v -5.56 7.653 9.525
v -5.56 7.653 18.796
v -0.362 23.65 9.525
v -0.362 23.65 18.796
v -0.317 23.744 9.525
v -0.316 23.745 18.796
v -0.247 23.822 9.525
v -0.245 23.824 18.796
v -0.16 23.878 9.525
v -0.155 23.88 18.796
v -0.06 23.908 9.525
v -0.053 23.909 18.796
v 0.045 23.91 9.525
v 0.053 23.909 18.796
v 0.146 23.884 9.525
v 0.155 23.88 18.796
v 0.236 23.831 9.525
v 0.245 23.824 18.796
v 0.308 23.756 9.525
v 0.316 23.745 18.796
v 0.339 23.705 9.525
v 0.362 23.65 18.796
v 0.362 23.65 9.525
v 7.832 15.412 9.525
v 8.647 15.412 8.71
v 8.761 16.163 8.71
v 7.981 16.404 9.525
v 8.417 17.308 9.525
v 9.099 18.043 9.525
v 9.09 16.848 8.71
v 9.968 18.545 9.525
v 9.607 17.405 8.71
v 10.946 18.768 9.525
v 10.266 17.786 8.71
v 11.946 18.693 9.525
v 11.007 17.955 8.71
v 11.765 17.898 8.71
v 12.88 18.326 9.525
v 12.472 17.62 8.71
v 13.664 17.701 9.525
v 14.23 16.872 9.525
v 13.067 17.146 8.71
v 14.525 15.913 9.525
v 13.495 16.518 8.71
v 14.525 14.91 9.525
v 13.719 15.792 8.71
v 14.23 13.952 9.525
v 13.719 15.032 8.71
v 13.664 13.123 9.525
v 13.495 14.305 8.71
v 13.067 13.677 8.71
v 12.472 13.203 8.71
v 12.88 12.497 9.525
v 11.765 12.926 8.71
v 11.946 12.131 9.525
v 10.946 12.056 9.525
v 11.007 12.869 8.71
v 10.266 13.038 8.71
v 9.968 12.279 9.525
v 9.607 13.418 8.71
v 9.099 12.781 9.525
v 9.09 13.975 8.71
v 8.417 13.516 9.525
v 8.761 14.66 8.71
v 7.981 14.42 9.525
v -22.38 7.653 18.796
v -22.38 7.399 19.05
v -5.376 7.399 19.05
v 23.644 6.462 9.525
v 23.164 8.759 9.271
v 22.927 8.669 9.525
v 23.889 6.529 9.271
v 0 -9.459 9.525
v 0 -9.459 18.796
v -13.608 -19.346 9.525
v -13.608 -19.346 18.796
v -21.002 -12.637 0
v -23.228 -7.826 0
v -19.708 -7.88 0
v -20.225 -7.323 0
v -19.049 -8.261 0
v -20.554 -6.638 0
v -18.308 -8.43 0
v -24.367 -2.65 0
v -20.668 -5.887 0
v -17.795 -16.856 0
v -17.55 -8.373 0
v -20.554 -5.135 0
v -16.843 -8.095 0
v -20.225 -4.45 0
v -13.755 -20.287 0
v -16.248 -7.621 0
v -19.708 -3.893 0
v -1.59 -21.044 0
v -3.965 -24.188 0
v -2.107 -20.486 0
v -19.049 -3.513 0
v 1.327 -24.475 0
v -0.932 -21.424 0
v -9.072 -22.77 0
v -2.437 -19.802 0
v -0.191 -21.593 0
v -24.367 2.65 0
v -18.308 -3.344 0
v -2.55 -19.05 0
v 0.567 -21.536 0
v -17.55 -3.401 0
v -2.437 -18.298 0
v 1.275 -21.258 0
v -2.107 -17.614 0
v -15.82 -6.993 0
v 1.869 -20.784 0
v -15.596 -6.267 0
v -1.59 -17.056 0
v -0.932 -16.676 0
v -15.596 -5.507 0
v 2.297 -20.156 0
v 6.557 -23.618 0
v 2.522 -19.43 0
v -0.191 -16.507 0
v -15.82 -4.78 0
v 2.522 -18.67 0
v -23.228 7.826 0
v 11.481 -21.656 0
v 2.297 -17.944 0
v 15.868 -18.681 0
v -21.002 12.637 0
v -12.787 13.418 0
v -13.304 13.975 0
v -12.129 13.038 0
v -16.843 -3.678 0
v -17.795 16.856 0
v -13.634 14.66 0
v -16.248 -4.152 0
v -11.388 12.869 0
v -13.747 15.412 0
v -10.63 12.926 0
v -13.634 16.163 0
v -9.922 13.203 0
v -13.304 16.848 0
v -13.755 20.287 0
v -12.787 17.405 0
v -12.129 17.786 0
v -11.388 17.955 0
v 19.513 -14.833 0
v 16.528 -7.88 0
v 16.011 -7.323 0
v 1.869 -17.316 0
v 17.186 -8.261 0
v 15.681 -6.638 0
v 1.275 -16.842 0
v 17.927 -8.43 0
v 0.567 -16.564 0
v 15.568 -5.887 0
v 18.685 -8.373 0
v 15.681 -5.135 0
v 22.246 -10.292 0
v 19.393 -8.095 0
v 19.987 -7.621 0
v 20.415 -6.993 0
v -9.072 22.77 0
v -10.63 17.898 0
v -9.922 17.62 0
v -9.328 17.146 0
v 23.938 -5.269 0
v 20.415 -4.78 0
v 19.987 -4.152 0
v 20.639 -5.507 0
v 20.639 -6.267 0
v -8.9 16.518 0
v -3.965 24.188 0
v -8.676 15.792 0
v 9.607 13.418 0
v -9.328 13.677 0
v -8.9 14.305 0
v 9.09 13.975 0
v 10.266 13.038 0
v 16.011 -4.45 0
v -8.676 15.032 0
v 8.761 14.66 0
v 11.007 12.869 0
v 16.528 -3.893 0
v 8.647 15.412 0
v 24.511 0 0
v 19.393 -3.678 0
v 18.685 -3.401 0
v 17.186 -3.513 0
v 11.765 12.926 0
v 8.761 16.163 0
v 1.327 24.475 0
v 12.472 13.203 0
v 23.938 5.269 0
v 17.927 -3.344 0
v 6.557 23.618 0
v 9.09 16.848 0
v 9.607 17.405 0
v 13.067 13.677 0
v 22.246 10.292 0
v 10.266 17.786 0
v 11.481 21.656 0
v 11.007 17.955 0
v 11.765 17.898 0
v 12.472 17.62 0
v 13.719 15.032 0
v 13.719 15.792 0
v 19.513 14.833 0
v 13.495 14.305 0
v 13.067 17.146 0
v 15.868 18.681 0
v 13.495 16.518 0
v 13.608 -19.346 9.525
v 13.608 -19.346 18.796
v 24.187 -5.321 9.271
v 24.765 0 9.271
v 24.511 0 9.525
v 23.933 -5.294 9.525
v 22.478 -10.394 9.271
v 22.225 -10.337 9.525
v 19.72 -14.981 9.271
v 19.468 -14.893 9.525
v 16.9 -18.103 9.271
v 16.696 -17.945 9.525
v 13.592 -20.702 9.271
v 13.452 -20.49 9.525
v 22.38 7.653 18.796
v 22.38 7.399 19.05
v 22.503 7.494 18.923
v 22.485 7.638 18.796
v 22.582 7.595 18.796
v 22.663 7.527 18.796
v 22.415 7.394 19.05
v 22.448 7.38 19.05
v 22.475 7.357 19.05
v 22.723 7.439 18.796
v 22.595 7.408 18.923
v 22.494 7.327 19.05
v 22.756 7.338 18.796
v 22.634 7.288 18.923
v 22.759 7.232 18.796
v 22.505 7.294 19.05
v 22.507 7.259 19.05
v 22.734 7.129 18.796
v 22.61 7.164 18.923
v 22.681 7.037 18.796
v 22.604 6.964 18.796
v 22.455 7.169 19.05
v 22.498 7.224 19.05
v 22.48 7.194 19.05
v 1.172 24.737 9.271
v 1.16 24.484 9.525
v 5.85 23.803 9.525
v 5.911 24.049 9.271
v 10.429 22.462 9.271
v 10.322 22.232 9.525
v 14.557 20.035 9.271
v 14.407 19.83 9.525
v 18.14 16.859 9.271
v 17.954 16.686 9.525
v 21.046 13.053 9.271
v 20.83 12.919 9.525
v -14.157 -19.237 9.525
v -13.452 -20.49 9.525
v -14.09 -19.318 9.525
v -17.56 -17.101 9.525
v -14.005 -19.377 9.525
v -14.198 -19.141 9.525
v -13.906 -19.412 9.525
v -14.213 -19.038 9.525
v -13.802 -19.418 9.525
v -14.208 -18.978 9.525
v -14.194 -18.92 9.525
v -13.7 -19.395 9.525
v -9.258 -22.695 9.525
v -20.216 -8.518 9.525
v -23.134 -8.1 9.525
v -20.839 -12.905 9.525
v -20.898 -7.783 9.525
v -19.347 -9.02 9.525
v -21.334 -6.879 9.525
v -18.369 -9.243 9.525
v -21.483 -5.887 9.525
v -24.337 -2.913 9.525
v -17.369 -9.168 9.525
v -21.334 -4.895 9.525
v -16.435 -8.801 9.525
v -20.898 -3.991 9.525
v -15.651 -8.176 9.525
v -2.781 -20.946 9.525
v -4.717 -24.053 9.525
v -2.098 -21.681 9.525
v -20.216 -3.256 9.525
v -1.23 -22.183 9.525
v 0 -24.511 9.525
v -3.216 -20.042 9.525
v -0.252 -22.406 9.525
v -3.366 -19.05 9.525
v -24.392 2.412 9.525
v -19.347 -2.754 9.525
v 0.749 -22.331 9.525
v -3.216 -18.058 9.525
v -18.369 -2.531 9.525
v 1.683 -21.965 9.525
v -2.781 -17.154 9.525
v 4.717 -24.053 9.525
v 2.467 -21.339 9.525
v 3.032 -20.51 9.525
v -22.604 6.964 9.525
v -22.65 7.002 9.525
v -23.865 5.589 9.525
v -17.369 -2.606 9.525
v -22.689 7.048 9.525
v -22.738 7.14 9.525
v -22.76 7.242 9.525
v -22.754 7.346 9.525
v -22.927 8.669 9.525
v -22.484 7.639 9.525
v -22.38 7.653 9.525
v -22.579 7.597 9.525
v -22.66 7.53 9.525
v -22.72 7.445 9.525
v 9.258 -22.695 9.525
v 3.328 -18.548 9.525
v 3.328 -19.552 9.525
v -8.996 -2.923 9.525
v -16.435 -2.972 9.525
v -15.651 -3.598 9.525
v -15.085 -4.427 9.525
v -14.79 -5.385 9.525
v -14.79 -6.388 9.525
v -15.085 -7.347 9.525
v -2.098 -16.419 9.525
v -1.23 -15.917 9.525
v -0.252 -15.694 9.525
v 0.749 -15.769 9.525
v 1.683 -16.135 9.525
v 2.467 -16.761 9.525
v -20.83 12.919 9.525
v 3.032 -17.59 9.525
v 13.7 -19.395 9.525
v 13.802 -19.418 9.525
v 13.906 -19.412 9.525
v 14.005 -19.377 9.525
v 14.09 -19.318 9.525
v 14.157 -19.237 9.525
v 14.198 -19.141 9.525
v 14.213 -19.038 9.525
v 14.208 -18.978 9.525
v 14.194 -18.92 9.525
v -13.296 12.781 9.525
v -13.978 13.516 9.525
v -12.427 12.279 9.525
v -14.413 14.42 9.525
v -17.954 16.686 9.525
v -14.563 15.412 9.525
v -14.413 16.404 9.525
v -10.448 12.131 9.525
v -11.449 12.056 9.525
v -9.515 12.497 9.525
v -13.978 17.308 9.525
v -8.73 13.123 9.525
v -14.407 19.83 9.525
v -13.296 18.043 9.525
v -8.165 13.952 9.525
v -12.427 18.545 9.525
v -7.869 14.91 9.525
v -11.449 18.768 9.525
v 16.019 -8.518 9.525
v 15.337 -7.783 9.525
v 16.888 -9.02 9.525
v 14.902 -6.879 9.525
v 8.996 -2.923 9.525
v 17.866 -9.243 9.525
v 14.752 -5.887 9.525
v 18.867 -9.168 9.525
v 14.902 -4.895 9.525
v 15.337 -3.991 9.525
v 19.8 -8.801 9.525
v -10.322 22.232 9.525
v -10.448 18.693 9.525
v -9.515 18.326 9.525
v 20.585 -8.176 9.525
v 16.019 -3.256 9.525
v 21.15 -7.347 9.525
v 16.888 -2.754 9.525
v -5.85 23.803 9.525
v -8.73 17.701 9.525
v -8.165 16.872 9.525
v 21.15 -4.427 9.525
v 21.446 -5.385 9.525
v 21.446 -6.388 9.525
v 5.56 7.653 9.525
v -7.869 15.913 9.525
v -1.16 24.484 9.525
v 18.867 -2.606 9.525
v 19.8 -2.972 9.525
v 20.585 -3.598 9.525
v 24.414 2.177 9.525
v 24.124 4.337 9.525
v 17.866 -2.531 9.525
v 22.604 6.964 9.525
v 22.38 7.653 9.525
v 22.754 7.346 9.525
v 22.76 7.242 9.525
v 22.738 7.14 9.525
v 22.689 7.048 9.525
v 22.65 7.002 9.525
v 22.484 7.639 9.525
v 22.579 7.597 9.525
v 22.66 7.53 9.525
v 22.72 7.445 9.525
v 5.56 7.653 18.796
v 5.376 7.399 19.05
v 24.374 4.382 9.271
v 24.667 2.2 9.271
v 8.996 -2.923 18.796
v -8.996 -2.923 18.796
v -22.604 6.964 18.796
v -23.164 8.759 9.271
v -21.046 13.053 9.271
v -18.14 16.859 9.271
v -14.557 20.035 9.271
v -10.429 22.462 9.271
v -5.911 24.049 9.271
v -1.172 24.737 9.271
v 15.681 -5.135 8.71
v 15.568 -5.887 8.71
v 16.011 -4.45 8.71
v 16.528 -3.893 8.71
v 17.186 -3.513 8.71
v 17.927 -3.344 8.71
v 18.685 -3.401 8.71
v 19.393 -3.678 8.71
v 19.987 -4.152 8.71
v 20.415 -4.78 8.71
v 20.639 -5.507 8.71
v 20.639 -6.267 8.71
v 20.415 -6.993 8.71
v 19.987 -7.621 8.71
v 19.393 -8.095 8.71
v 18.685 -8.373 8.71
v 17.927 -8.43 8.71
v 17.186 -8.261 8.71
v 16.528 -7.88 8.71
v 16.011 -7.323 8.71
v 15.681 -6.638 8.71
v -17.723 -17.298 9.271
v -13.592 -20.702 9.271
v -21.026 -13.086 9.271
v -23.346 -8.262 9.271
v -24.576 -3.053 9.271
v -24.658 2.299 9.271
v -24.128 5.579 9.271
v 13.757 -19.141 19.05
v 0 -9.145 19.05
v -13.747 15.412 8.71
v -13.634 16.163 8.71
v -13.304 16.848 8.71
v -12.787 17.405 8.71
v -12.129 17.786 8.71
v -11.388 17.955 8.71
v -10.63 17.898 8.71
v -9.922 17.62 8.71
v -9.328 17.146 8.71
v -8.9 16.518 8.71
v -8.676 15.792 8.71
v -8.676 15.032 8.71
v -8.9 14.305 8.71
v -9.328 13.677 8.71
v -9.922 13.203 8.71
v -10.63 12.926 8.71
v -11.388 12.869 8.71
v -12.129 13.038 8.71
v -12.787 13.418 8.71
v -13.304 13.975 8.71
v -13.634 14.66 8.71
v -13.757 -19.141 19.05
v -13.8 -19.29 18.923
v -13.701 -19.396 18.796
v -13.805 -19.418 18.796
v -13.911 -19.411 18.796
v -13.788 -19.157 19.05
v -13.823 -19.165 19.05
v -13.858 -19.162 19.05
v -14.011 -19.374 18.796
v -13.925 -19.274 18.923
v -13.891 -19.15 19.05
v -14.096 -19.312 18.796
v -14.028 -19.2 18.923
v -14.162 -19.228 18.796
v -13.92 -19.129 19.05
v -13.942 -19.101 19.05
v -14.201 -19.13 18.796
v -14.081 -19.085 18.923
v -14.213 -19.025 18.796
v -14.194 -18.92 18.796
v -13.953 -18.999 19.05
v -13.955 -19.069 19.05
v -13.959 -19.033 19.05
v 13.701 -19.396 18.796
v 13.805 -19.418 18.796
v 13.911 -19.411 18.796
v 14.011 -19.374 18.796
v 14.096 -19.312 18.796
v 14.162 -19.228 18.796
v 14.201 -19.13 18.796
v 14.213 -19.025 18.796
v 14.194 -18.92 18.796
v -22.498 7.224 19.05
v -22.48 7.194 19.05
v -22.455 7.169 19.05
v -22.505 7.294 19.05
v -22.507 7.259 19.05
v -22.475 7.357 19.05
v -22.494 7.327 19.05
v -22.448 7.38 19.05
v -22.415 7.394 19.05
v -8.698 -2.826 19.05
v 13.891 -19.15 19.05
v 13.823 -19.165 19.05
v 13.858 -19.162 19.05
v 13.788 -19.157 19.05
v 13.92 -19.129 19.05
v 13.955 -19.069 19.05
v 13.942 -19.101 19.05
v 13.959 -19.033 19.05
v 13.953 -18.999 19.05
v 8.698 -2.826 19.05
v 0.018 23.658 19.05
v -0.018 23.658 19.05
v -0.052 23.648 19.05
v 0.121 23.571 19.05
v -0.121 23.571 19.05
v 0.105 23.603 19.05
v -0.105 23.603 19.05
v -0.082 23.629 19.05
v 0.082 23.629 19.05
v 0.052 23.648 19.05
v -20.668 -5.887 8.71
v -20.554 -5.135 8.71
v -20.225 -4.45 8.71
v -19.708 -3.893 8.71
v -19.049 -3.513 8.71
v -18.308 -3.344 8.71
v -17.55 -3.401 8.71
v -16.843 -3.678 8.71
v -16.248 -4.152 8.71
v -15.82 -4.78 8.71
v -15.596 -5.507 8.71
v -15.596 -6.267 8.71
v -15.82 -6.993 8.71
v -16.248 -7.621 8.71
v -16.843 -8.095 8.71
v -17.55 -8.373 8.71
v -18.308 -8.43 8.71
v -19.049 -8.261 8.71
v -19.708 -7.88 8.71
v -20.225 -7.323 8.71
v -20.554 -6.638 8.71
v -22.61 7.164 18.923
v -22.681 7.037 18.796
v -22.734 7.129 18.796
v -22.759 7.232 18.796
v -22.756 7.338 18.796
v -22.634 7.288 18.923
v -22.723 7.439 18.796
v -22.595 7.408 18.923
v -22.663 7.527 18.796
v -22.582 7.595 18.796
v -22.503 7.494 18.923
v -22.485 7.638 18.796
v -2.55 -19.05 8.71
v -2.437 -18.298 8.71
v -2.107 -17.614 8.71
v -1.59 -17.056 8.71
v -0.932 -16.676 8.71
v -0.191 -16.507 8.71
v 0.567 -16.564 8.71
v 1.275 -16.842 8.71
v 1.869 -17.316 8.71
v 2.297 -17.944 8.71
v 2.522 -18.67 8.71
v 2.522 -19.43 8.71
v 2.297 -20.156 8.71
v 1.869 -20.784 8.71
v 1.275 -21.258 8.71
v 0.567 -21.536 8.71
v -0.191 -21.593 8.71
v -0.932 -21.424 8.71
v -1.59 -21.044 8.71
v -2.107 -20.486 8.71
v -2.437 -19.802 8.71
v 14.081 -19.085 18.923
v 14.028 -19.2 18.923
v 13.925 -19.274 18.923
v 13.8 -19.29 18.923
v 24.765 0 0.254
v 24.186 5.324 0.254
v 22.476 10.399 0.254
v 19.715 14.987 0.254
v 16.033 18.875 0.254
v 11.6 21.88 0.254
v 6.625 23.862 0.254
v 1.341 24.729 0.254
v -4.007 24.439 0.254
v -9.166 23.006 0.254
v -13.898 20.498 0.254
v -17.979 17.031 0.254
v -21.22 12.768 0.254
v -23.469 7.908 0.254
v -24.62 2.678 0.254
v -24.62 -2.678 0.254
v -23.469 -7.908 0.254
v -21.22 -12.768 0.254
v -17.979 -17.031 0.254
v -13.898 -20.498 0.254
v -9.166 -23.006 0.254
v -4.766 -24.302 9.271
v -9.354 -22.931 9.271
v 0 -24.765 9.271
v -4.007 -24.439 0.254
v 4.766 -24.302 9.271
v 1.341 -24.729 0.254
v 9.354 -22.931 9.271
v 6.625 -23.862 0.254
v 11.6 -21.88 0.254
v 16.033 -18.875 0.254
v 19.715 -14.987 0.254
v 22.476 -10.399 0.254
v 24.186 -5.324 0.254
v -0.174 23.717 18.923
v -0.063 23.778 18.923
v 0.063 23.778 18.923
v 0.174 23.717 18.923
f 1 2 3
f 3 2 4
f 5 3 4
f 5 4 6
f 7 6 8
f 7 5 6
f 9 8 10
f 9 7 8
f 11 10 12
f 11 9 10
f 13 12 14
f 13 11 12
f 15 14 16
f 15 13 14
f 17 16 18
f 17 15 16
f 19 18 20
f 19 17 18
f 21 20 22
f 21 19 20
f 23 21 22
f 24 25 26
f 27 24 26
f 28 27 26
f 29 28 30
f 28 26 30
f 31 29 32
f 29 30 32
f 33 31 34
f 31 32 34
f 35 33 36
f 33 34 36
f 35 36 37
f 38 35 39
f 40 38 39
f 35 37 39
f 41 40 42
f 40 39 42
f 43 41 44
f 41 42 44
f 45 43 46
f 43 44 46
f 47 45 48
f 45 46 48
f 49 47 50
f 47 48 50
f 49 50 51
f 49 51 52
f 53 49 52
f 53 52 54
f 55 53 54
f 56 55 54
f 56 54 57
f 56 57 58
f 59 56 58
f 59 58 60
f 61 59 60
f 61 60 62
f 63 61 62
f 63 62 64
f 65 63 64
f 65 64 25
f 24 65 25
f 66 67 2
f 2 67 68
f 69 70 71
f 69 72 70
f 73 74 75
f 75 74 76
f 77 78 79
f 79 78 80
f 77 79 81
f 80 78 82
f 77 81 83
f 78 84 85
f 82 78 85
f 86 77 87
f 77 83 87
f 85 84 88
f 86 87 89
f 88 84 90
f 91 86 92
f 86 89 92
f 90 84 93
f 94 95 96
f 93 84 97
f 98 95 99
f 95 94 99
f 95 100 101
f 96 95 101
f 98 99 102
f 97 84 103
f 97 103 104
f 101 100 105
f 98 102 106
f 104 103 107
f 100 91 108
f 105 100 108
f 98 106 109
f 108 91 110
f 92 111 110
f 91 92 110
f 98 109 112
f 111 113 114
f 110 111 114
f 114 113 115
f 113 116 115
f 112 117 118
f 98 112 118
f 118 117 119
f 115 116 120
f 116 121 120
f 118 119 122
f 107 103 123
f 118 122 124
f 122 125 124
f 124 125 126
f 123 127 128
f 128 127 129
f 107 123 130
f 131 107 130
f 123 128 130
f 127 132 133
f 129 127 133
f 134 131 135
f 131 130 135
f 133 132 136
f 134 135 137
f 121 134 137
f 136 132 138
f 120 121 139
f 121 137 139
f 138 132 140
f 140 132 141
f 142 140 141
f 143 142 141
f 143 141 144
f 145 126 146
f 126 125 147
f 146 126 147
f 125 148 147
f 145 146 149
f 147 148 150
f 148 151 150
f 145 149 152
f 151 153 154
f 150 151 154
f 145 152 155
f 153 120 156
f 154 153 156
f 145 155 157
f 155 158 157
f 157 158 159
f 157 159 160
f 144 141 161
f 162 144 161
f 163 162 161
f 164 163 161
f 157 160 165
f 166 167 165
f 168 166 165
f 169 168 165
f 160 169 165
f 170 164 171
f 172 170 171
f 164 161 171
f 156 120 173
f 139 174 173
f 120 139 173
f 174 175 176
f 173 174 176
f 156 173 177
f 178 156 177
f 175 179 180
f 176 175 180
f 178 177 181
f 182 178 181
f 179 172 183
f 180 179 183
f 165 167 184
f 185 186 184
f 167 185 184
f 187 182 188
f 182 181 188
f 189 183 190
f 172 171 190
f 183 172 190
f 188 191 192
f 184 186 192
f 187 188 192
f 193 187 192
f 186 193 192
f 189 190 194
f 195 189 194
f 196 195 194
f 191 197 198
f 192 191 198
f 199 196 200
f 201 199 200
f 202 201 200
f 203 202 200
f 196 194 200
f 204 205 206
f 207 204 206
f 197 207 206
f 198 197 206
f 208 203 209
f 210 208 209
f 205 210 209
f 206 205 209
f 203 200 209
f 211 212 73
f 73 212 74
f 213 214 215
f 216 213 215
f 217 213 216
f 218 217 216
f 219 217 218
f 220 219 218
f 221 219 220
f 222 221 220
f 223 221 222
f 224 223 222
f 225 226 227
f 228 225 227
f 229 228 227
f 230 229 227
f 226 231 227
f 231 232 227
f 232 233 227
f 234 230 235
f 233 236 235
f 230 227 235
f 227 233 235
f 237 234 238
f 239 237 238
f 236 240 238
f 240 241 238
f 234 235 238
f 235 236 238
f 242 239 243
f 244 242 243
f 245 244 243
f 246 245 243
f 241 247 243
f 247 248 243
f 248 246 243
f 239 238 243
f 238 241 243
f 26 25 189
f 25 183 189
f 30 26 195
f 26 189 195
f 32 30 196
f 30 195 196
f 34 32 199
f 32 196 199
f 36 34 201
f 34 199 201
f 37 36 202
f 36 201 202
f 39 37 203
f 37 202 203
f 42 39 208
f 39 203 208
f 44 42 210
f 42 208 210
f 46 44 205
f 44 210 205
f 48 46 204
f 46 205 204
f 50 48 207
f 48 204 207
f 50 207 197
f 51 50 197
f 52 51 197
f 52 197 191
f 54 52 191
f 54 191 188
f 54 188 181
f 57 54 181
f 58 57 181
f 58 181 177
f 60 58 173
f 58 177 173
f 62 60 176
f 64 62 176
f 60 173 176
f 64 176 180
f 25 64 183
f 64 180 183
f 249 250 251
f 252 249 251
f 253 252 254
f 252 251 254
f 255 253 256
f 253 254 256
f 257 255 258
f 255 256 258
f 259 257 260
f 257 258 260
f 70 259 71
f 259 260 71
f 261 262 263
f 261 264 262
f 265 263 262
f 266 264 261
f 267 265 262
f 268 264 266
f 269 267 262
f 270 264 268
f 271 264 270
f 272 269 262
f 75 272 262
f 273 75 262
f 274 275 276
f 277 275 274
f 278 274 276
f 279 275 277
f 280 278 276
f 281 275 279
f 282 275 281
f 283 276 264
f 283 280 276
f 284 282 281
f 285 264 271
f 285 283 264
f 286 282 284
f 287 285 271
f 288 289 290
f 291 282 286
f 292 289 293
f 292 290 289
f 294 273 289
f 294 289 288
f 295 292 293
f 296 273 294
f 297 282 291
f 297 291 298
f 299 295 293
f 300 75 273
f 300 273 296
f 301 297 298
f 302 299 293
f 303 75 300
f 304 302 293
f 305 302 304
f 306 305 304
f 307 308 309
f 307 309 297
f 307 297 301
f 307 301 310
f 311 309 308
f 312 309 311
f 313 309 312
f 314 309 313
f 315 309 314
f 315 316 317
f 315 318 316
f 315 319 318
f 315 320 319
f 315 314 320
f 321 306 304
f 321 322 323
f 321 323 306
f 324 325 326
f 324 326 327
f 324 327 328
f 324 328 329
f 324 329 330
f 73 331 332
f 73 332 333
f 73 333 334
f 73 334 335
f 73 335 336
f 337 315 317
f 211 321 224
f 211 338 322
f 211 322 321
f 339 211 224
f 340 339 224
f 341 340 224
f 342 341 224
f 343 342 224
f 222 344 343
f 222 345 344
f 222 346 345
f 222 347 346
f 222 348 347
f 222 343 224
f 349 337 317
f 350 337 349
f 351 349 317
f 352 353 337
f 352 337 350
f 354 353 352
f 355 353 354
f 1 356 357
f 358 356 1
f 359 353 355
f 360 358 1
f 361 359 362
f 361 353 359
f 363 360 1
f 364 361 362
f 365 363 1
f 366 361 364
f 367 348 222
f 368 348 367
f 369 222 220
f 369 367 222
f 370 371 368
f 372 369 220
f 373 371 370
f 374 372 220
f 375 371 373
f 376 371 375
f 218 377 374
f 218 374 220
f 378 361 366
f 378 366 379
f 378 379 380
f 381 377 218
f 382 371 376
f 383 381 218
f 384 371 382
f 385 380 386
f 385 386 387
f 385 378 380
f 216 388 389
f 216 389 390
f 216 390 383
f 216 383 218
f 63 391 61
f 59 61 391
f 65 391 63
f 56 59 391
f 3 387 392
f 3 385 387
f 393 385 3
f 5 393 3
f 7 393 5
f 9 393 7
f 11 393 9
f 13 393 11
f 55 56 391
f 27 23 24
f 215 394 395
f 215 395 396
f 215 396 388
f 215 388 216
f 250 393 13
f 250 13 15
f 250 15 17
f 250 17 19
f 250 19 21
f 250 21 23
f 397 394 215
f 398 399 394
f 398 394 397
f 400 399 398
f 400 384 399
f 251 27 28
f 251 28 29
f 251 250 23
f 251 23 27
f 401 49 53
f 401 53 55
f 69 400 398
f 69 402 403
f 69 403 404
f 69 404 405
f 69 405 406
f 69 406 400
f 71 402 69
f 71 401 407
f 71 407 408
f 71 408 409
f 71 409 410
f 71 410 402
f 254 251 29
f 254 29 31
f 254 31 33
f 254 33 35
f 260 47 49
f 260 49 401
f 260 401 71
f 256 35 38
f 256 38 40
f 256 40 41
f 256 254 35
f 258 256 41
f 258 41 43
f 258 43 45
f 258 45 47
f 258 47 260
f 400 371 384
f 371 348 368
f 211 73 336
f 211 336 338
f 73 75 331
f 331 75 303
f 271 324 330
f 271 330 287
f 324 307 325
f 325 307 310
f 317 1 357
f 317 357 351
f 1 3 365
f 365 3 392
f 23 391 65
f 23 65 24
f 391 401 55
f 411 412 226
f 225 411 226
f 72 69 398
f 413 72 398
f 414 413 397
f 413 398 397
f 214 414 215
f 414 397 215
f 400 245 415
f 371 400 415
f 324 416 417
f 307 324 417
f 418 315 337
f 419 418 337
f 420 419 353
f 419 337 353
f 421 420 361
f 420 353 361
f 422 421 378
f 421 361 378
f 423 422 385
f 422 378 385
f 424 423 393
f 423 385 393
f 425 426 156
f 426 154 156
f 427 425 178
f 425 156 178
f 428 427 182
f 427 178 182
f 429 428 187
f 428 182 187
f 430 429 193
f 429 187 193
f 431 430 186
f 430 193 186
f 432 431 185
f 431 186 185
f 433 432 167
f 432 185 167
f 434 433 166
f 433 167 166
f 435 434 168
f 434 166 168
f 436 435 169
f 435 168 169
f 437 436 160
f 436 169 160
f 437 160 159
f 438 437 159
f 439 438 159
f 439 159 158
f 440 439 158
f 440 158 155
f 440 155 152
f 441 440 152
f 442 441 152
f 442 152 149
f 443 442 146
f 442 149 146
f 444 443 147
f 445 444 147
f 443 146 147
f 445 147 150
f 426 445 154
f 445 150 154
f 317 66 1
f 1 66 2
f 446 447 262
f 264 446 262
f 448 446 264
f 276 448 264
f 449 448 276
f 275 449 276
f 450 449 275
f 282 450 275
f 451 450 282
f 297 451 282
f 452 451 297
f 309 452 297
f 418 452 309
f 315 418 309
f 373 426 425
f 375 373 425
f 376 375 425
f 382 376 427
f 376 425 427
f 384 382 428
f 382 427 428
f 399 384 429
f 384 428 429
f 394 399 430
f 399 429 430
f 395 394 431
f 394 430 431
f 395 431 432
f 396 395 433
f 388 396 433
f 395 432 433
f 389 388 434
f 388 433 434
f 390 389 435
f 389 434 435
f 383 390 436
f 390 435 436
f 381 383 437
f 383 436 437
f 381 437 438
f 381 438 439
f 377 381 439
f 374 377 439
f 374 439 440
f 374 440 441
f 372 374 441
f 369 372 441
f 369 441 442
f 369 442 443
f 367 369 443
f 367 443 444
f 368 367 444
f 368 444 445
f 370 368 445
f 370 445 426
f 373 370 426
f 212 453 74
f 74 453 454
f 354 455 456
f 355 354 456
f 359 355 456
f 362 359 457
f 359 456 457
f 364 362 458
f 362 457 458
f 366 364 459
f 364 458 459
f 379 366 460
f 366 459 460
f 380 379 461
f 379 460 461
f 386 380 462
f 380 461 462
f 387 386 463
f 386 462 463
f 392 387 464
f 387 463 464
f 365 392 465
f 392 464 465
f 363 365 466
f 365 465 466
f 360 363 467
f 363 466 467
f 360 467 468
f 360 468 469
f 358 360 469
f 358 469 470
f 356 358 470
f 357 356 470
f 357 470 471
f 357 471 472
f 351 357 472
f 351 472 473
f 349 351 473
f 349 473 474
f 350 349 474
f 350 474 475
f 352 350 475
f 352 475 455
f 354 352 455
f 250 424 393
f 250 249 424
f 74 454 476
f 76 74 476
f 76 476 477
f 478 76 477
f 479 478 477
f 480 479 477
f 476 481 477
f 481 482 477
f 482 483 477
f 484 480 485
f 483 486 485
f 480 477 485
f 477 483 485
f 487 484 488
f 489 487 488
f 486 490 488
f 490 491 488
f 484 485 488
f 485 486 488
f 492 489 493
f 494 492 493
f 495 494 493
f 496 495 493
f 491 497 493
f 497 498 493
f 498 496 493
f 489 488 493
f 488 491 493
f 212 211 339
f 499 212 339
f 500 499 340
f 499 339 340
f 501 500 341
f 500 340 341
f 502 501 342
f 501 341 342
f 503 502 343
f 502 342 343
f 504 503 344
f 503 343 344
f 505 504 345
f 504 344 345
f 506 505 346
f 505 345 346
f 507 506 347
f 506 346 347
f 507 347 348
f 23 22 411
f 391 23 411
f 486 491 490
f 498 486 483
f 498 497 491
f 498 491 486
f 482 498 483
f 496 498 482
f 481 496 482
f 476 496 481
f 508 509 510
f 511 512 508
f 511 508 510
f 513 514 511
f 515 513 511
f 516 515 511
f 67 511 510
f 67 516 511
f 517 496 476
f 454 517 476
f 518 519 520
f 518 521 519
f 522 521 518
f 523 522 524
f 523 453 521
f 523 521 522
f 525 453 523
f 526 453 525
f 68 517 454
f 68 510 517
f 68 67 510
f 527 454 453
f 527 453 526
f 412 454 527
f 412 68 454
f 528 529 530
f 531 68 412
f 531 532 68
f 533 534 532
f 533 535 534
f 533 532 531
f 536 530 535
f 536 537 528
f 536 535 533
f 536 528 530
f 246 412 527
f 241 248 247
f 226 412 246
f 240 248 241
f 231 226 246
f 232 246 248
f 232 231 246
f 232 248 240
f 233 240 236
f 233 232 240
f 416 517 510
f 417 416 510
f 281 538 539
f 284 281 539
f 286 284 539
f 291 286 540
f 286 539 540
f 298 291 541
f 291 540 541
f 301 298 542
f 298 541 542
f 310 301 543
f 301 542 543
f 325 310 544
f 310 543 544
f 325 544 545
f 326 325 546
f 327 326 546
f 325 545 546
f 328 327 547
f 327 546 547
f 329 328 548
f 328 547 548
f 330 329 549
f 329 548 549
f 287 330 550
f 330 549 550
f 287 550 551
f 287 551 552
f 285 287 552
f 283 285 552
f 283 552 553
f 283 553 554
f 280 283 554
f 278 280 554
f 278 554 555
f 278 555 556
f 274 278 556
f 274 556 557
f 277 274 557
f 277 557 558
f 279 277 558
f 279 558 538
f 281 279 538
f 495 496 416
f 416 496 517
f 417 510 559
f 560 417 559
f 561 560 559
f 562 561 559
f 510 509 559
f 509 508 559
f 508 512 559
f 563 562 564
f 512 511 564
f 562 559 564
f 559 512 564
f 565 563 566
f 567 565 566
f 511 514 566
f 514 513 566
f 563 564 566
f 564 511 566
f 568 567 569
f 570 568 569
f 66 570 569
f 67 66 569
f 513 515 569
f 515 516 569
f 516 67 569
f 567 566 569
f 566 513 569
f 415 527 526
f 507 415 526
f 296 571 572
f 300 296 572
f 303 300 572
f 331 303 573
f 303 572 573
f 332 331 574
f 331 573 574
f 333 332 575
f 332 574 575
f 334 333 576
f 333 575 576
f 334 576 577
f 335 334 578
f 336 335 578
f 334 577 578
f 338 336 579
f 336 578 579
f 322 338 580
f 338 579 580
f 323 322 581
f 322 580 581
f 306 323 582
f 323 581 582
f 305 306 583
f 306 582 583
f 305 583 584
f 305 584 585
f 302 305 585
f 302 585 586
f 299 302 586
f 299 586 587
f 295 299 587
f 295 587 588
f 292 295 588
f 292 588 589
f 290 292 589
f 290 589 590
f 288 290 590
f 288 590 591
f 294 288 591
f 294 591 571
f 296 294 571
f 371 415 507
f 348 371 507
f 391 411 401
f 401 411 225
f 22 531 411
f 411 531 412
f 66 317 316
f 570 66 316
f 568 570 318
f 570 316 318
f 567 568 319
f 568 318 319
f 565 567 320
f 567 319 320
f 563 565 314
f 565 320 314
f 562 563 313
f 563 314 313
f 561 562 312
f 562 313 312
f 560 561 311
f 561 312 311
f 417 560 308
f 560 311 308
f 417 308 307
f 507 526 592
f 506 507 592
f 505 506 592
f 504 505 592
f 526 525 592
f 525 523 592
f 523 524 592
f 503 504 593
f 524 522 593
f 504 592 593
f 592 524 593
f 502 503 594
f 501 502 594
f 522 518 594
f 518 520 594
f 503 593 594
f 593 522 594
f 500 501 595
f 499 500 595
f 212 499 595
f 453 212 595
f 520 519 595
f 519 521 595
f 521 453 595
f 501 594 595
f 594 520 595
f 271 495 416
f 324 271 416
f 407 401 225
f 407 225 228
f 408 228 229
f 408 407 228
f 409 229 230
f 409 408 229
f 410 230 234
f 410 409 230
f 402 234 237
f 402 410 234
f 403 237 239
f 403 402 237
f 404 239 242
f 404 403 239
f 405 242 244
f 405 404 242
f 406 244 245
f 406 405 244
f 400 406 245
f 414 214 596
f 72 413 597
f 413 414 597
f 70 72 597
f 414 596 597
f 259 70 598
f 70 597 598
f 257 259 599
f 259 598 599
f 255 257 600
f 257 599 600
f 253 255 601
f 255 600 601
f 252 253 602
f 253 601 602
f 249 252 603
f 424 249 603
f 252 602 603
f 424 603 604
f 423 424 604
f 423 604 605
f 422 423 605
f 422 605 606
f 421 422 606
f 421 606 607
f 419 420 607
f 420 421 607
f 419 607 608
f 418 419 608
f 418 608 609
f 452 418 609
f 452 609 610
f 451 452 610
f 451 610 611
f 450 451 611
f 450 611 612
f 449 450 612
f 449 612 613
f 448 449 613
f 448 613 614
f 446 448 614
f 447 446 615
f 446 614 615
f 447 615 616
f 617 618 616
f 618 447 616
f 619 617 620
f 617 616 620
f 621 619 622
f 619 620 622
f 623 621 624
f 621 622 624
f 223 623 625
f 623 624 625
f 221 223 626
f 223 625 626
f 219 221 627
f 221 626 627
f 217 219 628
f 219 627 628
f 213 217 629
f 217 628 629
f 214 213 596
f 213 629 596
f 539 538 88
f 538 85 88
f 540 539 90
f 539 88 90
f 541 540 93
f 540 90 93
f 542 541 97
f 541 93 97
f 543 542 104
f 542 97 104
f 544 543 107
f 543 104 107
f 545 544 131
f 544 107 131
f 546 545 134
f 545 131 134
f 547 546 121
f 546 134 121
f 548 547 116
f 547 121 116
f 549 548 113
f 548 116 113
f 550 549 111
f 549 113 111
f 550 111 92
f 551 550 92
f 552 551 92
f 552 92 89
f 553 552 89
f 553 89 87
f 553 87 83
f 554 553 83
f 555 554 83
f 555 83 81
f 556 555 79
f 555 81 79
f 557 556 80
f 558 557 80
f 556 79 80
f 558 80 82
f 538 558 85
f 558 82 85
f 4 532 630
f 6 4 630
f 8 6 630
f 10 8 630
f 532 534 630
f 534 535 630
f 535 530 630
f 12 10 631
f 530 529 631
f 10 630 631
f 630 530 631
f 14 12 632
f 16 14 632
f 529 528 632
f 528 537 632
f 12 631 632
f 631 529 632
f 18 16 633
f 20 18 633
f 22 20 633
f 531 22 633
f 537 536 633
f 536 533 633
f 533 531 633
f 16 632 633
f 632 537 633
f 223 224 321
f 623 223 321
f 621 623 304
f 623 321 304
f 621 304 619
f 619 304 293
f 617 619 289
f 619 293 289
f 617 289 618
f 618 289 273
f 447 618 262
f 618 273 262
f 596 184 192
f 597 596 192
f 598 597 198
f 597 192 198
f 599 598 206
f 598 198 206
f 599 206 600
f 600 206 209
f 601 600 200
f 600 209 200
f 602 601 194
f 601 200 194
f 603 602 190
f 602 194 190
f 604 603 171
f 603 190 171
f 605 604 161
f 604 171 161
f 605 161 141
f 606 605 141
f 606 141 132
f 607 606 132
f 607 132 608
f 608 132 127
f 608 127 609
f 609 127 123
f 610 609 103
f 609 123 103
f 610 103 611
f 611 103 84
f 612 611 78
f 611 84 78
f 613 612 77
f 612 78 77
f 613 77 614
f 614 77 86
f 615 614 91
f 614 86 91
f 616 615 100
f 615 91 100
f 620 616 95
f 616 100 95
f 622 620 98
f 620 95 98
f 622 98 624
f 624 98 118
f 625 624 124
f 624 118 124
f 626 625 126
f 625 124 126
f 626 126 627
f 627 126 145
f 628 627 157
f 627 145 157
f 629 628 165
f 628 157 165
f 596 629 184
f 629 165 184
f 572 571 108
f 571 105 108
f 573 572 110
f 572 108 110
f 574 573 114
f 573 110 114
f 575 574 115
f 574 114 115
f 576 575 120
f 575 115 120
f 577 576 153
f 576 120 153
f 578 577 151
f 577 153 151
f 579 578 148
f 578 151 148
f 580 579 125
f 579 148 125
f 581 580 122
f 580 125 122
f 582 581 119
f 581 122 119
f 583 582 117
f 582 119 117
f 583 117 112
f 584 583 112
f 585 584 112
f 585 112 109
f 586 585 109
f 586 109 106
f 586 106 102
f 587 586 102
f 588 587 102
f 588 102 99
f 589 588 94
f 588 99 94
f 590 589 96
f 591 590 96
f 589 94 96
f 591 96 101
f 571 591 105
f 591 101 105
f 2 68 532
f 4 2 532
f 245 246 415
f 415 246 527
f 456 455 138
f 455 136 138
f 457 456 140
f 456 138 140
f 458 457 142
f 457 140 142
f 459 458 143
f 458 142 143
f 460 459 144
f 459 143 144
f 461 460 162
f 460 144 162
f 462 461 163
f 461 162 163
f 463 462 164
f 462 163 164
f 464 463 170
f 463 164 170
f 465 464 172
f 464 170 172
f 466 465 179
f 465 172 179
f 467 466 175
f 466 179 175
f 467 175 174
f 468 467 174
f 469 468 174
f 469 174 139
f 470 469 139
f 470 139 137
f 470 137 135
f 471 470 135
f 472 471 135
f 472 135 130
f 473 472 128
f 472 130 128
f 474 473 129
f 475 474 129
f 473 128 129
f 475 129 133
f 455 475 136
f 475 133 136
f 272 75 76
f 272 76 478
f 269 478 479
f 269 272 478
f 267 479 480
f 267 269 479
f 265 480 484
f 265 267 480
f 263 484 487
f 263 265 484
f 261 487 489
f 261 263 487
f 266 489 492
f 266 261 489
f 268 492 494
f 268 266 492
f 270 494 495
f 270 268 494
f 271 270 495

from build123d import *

# Parameters (mm, degrees)
CYLINDER_R       = 24.765
CYLINDER_DEPTH   = 19.05
SKETCH_R         = 25.4
POCKET_DEPTH     = 9.525
HOLE_D           = 5.1
HOLE_DEPTH       = 9.525
HOLE_CSINK_D     = 6.731
HOLE_CSINK_ANGLE = 90
HOLE_TIPS_R      = 2.55
FILLET_R         = 0.381
CHAMFER_SIZE     = 0.254


with BuildPart() as part:
    # Cylinder → Cylinder (join)
    with BuildSketch(Plane.XY):
        Circle(CYLINDER_R)
    extrude(amount=CYLINDER_DEPTH)

    # Sketch (on Face3 of Cylinder) → Pocket (cut)
    with BuildSketch(Plane.XY.offset(19.05)):
        Circle(SKETCH_R)
        Polygon((0, 24.765), (5.560089, 7.652806), (23.552915, 7.652806), (8.996413, -2.923112), (14.556502, -20.035306), (0, -9.459388), (-14.556502, -20.035306), (-8.996413, -2.923112), (-23.552915, 7.652806), (-5.560089, 7.652806), align=None, mode=Mode.SUBTRACT)
    extrude(amount=-POCKET_DEPTH, mode=Mode.SUBTRACT)

    # Hole
    with Locations(Plane.XY.offset(9.525)):
        with Locations((11.197309, 15.411774), (-11.197309, 15.411774), (-18.117627, -5.886774), (0, -19.05), (18.117627, -5.886774)):
            CounterSinkHole(HOLE_D / 2, HOLE_CSINK_D / 2, depth=HOLE_DEPTH, counter_sink_angle=HOLE_CSINK_ANGLE)

    # Hole tips → Hole tip 1 section 0
    with BuildSketch(Plane.XY, mode=Mode.PRIVATE) as hole_tip_1_s0:
        with Locations((11.197309, 15.411774)):
            Circle(HOLE_TIPS_R)
    loft([hole_tip_1_s0.sketch, Vertex(11.197309, 15.411774, -1.532195)], mode=Mode.SUBTRACT)

    # Hole tips → Hole tip 2 section 0
    with BuildSketch(Plane.XY, mode=Mode.PRIVATE) as hole_tip_2_s0:
        with Locations((-11.197309, 15.411774)):
            Circle(HOLE_TIPS_R)
    loft([hole_tip_2_s0.sketch, Vertex(-11.197309, 15.411774, -1.532195)], mode=Mode.SUBTRACT)

    # Hole tips → Hole tip 3 section 0
    with BuildSketch(Plane.XY, mode=Mode.PRIVATE) as hole_tip_3_s0:
        with Locations((-18.117627, -5.886774)):
            Circle(HOLE_TIPS_R)
    loft([hole_tip_3_s0.sketch, Vertex(-18.117627, -5.886774, -1.532195)], mode=Mode.SUBTRACT)

    # Hole tips → Hole tip 4 section 0
    with BuildSketch(Plane.XY, mode=Mode.PRIVATE) as hole_tip_4_s0:
        with Locations((0, -19.05)):
            Circle(HOLE_TIPS_R)
    loft([hole_tip_4_s0.sketch, Vertex(0, -19.05, -1.532195)], mode=Mode.SUBTRACT)

    # Hole tips → Hole tip 5 section 0
    with BuildSketch(Plane.XY, mode=Mode.PRIVATE) as hole_tip_5_s0:
        with Locations((18.117627, -5.886774)):
            Circle(HOLE_TIPS_R)
    loft([hole_tip_5_s0.sketch, Vertex(18.117627, -5.886774, -1.532195)], mode=Mode.SUBTRACT)

    # Fillet
    fillet_edges = [part.edges().sort_by_distance(p)[0] for p in [
        (14.556502, -20.035306, 14.2875),
        (23.552915, 7.652806, 14.2875),
        (0, 24.765, 14.2875),
        (-23.552915, 7.652806, 14.2875),
        (-14.556502, -20.035306, 14.2875),
    ]]
    fillet(fillet_edges, radius=FILLET_R)

    # Chamfer
    chamfer_edges = [part.edges().sort_by_distance(p)[0] for p in [
        (0, -24.765, 9.525),
        (-6.803925, -14.402729, 19.05),
        (-15.800338, 2.020229, 19.05),
        (-2.961221, 15.6513, 19.05),
        (13.970203, 7.652806, 19.05),
        (11.595281, -10.921606, 19.05),
        (-24.765, 0, 0),
    ]]
    chamfer(chamfer_edges, length=CHAMFER_SIZE)


solid = part.part
